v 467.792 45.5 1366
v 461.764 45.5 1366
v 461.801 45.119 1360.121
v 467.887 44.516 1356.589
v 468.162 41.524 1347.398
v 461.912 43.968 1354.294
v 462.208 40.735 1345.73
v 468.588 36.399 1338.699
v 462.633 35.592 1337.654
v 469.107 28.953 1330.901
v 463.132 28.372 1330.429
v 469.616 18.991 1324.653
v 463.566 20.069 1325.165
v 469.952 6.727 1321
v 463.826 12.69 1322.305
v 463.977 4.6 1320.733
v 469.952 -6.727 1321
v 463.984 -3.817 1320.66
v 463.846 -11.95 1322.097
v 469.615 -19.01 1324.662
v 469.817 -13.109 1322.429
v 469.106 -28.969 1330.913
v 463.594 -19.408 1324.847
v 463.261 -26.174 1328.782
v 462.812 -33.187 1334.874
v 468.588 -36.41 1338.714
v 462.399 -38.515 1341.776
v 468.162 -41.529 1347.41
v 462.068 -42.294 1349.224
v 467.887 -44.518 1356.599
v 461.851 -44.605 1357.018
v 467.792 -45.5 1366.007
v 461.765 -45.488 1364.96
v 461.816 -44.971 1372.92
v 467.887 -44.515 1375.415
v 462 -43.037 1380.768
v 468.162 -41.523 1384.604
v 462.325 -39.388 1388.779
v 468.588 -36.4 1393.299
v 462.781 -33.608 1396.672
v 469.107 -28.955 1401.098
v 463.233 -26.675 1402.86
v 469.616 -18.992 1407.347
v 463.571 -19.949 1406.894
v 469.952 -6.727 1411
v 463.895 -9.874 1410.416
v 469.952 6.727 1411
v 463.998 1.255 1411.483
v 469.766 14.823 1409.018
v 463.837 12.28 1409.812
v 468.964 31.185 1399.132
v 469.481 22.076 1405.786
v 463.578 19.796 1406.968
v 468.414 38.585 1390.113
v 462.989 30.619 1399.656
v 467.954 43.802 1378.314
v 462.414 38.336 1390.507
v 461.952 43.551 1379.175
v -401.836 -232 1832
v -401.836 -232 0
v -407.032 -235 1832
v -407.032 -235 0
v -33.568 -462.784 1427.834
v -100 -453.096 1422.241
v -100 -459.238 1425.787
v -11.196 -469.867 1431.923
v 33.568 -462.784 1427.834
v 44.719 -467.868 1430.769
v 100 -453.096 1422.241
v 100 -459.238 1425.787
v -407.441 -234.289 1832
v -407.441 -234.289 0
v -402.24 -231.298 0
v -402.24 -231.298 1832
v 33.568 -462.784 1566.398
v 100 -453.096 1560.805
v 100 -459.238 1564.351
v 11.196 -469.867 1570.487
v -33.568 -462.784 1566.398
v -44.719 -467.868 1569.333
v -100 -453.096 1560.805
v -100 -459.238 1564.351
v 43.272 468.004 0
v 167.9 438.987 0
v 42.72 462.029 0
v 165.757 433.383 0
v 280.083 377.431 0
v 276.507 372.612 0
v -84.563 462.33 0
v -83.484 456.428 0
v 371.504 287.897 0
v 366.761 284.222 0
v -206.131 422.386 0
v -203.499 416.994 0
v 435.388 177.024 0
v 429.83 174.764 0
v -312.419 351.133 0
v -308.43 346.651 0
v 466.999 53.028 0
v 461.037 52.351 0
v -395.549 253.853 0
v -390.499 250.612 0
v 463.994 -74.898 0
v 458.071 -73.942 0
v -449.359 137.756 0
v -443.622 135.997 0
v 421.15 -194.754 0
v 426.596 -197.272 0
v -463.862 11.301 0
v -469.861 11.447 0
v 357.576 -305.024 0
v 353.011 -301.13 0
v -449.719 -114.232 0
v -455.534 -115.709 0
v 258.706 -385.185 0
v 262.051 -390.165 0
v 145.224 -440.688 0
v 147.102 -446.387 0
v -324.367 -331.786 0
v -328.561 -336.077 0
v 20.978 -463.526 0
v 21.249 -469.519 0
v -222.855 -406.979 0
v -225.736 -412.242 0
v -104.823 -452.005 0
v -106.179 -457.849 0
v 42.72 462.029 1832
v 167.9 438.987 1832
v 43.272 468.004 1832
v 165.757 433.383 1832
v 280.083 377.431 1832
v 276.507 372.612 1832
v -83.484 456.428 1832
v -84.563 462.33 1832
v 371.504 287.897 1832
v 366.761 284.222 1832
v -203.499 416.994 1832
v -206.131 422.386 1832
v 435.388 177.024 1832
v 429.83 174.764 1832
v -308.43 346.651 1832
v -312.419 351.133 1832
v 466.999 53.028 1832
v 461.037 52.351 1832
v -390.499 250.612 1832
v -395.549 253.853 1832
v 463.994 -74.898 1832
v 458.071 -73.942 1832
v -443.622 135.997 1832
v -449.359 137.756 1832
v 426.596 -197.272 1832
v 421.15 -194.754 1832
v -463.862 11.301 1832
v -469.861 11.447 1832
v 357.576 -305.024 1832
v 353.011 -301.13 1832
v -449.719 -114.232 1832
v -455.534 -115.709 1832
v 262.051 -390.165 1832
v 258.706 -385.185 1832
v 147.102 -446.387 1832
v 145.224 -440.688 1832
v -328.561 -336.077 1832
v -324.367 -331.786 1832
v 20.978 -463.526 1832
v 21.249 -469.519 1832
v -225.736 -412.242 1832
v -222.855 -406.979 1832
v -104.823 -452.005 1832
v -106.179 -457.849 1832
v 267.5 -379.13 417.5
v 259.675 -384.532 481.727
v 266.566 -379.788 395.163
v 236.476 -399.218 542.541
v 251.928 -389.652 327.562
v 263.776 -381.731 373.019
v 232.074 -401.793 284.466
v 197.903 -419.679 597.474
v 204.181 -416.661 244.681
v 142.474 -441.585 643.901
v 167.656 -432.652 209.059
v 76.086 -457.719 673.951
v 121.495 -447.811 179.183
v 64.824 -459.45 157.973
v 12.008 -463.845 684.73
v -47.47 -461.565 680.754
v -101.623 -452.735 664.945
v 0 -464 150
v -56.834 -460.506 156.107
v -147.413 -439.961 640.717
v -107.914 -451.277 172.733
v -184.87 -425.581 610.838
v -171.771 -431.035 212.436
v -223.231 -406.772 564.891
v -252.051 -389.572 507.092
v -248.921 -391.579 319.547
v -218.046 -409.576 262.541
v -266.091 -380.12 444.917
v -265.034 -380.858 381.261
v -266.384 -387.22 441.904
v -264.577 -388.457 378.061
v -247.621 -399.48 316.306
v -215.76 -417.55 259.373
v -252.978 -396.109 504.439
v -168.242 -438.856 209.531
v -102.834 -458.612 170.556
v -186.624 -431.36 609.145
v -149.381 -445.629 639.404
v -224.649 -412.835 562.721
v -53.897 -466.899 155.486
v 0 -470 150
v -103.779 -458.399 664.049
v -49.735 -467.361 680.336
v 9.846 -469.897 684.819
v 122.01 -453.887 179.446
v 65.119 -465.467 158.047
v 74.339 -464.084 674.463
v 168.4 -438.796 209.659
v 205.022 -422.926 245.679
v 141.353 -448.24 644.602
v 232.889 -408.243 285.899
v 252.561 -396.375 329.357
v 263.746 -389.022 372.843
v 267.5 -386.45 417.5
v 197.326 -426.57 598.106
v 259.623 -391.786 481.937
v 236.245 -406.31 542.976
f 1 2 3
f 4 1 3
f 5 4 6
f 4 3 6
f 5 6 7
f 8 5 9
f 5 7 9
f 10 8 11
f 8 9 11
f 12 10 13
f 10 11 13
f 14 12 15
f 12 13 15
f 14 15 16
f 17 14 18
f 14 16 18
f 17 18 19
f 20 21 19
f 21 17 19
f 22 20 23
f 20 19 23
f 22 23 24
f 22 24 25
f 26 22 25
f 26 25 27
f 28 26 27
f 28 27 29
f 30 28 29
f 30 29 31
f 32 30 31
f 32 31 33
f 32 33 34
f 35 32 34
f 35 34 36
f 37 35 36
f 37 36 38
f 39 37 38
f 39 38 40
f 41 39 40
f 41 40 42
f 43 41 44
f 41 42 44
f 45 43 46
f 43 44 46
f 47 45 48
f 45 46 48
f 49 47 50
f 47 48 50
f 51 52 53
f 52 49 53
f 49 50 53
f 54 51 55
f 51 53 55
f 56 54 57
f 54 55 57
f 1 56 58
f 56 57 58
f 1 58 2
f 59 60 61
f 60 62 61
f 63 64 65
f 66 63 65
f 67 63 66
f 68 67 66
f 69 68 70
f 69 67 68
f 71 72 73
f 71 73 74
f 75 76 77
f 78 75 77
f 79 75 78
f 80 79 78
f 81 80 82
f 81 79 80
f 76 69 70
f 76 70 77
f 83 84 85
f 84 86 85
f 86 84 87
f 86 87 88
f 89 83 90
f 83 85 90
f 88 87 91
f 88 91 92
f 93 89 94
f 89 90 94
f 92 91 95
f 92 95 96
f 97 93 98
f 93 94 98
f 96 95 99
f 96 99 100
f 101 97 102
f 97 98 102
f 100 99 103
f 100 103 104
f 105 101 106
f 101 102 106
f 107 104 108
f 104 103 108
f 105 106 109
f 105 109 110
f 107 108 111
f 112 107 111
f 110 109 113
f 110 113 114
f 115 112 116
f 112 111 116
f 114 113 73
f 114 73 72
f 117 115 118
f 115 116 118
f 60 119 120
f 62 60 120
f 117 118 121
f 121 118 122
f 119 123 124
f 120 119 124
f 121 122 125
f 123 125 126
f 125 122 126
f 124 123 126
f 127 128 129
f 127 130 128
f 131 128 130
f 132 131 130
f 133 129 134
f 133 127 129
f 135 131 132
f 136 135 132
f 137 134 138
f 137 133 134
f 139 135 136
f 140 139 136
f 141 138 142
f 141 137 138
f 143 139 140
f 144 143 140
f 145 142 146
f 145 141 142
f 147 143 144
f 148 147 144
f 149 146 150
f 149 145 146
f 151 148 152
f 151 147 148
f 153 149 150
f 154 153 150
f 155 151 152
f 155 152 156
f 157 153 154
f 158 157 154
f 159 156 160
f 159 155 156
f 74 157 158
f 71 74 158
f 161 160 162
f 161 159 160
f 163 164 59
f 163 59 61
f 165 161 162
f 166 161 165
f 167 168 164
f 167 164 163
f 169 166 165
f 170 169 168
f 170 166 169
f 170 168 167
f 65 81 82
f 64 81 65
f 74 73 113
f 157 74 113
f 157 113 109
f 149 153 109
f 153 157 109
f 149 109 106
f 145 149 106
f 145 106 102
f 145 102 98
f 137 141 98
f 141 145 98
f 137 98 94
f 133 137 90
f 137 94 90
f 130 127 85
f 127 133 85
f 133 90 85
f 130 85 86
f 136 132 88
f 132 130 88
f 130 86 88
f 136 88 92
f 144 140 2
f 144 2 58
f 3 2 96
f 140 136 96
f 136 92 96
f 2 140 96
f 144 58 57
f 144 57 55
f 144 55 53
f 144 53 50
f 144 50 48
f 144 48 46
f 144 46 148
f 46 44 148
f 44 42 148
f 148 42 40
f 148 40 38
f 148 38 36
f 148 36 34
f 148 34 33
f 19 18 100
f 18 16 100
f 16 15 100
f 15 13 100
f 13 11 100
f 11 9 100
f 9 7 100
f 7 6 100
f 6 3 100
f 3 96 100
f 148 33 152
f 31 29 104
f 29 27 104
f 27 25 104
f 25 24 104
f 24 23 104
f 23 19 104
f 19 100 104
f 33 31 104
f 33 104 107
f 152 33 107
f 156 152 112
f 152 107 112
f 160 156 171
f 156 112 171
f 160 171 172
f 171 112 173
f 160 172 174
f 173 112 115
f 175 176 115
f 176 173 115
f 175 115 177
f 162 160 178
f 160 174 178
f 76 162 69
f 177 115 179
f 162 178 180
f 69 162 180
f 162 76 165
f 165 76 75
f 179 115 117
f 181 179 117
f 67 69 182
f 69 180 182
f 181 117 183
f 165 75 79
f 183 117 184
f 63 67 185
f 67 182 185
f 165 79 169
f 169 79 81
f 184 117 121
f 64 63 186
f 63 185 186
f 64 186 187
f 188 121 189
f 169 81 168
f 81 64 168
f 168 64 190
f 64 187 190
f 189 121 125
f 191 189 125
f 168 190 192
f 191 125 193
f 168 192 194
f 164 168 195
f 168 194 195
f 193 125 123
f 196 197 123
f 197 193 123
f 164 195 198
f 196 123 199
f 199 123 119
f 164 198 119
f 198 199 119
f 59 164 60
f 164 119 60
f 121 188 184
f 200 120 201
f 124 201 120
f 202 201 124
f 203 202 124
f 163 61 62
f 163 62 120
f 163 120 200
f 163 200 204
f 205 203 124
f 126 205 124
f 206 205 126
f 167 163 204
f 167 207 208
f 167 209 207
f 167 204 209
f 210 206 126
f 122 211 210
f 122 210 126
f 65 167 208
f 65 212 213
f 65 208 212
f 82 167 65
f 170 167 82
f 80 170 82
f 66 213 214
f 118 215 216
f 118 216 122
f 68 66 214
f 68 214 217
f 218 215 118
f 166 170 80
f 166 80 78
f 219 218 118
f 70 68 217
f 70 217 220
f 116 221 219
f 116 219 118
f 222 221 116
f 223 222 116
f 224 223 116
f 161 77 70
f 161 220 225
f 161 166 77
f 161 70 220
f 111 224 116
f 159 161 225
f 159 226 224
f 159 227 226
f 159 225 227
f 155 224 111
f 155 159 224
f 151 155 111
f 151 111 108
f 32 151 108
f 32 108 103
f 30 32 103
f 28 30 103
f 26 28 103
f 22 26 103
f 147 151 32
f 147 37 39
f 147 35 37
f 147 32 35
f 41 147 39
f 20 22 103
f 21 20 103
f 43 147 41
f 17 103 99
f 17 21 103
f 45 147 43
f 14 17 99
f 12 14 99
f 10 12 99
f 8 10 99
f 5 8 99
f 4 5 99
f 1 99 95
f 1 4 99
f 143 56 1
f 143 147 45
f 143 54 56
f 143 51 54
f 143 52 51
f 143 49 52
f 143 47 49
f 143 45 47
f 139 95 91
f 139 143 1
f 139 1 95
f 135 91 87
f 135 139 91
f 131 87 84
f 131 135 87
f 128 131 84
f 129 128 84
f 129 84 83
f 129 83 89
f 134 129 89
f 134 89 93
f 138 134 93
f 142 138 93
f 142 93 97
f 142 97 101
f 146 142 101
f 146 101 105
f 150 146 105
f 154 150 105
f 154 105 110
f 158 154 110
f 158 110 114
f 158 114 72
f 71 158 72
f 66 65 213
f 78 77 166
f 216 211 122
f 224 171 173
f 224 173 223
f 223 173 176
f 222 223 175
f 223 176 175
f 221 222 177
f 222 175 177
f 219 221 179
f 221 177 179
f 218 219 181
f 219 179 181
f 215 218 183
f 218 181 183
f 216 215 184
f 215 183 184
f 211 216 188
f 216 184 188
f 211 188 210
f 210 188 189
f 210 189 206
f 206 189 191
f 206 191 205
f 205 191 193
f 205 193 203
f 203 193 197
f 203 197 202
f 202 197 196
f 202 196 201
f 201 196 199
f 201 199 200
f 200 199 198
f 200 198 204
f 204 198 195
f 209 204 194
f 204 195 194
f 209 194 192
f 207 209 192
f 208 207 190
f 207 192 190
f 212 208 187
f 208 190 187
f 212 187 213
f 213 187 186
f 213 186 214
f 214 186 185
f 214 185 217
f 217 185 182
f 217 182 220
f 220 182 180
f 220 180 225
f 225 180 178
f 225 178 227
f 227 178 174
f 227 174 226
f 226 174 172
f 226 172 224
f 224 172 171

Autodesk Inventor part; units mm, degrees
sketch "Sketch13" plane through (0, 0, 0) normal (0, 0, 1) x (1, 0, 0)
  circle A0 centre (0, 0) radius 470 construction
  line L0 (0, 0) -> (0, -470)
  line L1 (0, 0) -> (-407.0319, -235)
  line L2 (0, 0) -> (470, 0)
  line L3 (0, 0) -> (0, -470)
  line L4 (0, 0) -> (0, -470)
  line L5 (0, 0) -> (418.7731, 213.3755)
  line L6 (0, 0) -> (0, 470)
  dimension "d53" = 940
  dimension "d55" = 0
  dimension "d98" = 180
  dimension "d99" = 240
  dimension "d100" = 63
  dimension "d101" = 90
ref_plane "WeldJoint" through (0, 0, -10) normal (0.5, -0.866, 0) x (0, 0, 1)
ref_plane "Inlet_Clock_Angle_plane" through (0, 0, -10) normal (0, 1, 0) x (0, 0, 1)
ref_plane "Charging" through (0, 0, -10) normal (1, 0, 0) x (0, 0, 1)
ref_plane "Accsess" through (0, 0, -10) normal (1, 0, 0) x (0, 0, 1)
sketch "Sketch14" plane through (0, 0, -10) normal (0.5, -0.866, 0) x (0, 0, 1)
  line L0 (1842, 464) -> (10, 464)
  line L1 (10, 464) -> (10, 470)
  line L2 (10, 470) -> (1842, 470)
  line L3 (1842, 470) -> (1842, 464)
  line L4 (10, 0) -> (1842, 0)
  line L5 (10, 470) -> (-20, 470) construction
  line L6 (10, 464) -> (-20, 464) construction
  arc A0 (-20, 464) -> (-74.1579, 429.8249) centre (-20, 404) ccw construction
  arc A1 (-74.1579, 429.8249) -> (-168, 15) centre (795.7784, 15) ccw construction
  line L7 (-168, 15) -> (-168, 0) construction
  line L8 (10, 0) -> (-168, 0) construction
  arc A2 (-20, 470) -> (-79.5736, 432.4074) centre (-20, 404) ccw construction
  arc A3 (-79.5736, 432.4074) -> (-174, 15) centre (795.7784, 15) ccw construction
  line L9 (-174, 15) -> (-174, 0) construction
  line L10 (-168, 0) -> (-174, 0) construction
  line L11 (1842, 464) -> (1872, 464)
  line L12 (1842, 470) -> (1872, 470)
  line L13 (1842, 0) -> (2020, 0) construction
  line L14 (2026, 0) -> (2026, 15) construction
  arc A4 (2026, 15) -> (1931.5736, 432.4074) centre (1056.2216, 15) ccw construction
  arc A5 (1931.5736, 432.4074) -> (1872, 470) centre (1872, 404) ccw construction
  line L15 (2020, 0) -> (2020, 15) construction
  line L16 (2020, 0) -> (2026, 0) construction
  arc A6 (2020, 15) -> (1926.1579, 429.8249) centre (1056.2216, 15) ccw construction
  arc A7 (1926.1579, 429.8249) -> (1872, 464) centre (1872, 404) ccw construction
  line L17 (-119.3891, 418.399) -> (-474, 418.399)
  line L18 (-474, 418.399) -> (-474, 338.399)
  line L19 (-474, 338.399) -> (-119.3891, 338.399)
  line L20 (-119.3891, 338.399) -> (-119.3891, 418.399)
  line L21 (2026, 15) -> (2056, 15) construction
  line L22 (2056, 15) -> (2056, 0) construction
  line L23 (2056, 0) -> (2026, 0) construction
  line L24 (-474, 498.399) -> (-474, 418.399)
  line L25 (-474, 498.399) -> (-468, 498.399)
  line L26 (-468, 498.399) -> (-468, 418.399)
  line L27 (-81.71, 432.3205) -> (-126.8357, 319.837)
  line L28 (-119.3891, 418.399) -> (-87.295, 418.399)
  line L29 (-74.1579, 429.8249) -> (-79.5736, 432.4074)
  line L30 (-81.71, 432.3205) -> (-81.3377, 433.2486) construction
  line L31 (-81.3377, 433.2486) -> (-79.5736, 432.4074) construction
  line L32 (-474, 498.399) -> (-474, 498.399)
  line L33 (-474, 498.399) -> (-474, 338.399)
  line L34 (-474, 338.399) -> (-474, 338.399)
  line L35 (1421, 470) -> (1331, 470)
  line L36 (1331, 470) -> (1331, 570)
  line L37 (1331, 570) -> (1421, 570)
  line L38 (1421, 570) -> (1421, 470)
  point P0 (10, 467)
  point P1 (-104.2729, 376.0787)
  point P2 (1376, 570)
  dimension "d59" = 1832
  dimension "d60" = 6
  dimension "d61" = 940
  dimension "d82" = 60
  dimension "d83" = 30
  dimension "d86" = 80
  dimension "d87" = 30
  dimension "d91" = 15
  dimension "d92" = 20
  dimension "d93" = 184
  dimension "d94" = 30
  dimension "d103" = 386.705
  dimension "d104" = 21.86
  dimension "d105" = 121.1976
  dimension "d107" = 1
  dimension "d108" = 676.798
  dimension "d109" = 0
  dimension "d110" = 2530
  dimension "d111" = 300
  dimension "d112" = 100
  dimension "d113" = 90
  dimension "d114" = 1850
  dimension "d115" = 1366
revolve "Revolution2" add sketch "Sketch14" angle 359.9 about axis through (0, 0, 0) along (0, 0, 1) contours L0 L1 L2 L3
sketch "Sketch AnglePlane_InletPipe" plane through (0, 0, -10) normal (0, 1, 0) x (0, 0, 1)
  line L0 (10, -470) -> (10, 470) projected
  line L1 (10, 0) -> (1376, 0)
  line L2 (1376, 0) -> (1376, 470)
  line L3 (1376, 470) -> (10, 470)
  line L4 (10, 470) -> (10, 0)
  point P0 (10, -407.0319)
  point P1 (10, -407.4415)
  dimension "d63" = 940
  dimension "d64" = 90
  dimension "frd_hght" = 1366
ref_plane "InletPipe_AnglePlane" through (0, 0, 1366) normal (1, 0, 0) x (0, 1, 0)
sketch "Sketch16" plane through (0, 0, 1366) normal (1, 0, 0) x (0, 1, 0)
  circle A0 centre (0, 0) radius 45.5
  point P0 (0, -1366)
  point P1 (0, 0)
  point P2 (0, 0)
  point P3 (0, 0)
  dimension "d66" = 91
extrude "Extrusion7" cut sketch "Sketch16" along normal through all
ref_plane "Work Plane16" through (0, 0, 0) normal (0, -1, 0) x (1, 0, 0)
sketch "Sketch17" plane through (0, 0, 0) normal (0, -1, 0) x (1, 0, 0)
  circle A0 centre (0, 417.5) radius 267.5
  line L0 (0, 150) -> (-495.5727, 150)
  point P0 (0, 0)
  dimension "d69" = 535
  dimension "d71" = 150
extrude "Extrusion8" cut sketch "Sketch17" along normal through all
sketch "ChargingAngleSketch19" plane through (0, 0, -10) normal (1, 0, 0) x (0, 0, 1)
  line L0 (10, 0) -> (1170.6454, 0)
  line L1 (1170.6454, 0) -> (1442, 470)
  line L2 (1442, 470) -> (10, 470)
  line L3 (10, 470) -> (10, 0)
  dimension "d74" = 1432
  dimension "d76" = 940
  dimension "d77" = 60
ref_plane "Work Plane18" through (0, 0, 1160.6454) normal (0, -0.866, 0.5) x (1, 0, 0)
sketch "Sketch20" plane through (0, 0, 1160.6454) normal (0, -0.866, 0.5) x (1, 0, 0)
  line L0 (-100, 0) -> (100, 0)
  line L1 (100, 0) -> (100, 120)
  line L2 (100, 120) -> (-100, 120)
  line L3 (-100, 120) -> (-100, 0)
  point P0 (0, -1005.1484)
  point P1 (0, 0)
  point P2 (0, 0)
  point P3 (0, 0)
  point P4 (0, 0)
  dimension "d78" = 200
  dimension "d79" = 120
extrude "Charging hole" cut sketch "Sketch20" along normal through all
equation "\"BendRadius\" = Thickness"
equation "\"BendReliefWidth\" = Thickness"
equation "\"BendReliefDepth\" = 0.5 * Thickness"
equation "\"CornerReliefSize\" = 4 * Thickness"
equation "\"MinimumRemnant\" = 2 * Thickness"
equation "\"TransitionRadius\" = BendRadius"
equation "\"JacobiRadiusSize\" = BendRadius"
equation "\"GapSize\" = Thickness"
equation "\"InletPipe_horisont_angle\" = 0"
equation "\"AccsessHatch_ClockAngle\" = 0"
equation "\"ChargingHatch_ClockAgnle\" = 180deg"
equation "\"InletPipe_Clock_angle\" = 90deg"
equation "\"OutletPipe_ClockAngle\" = 63deg"
equation "\"WeldJoint_ClockAgnle\" = 240deg"
equation "\"AA_MAIN_Shell_hight\" = 1832"
equation "\"Legs_Tube_lenght\" = 386.70499"
equation "\"Legs_Upper_plate_lenght\" = 121.19761"
equation "\"Legs_Inner_diam\" = 676.79799"
equation "\"AA_MAIN_dish_hight\" = 184"
equation "\"Thickness\" = 6"
properties part number "PRS 0101 main shell D1200 940" material "Steel"
